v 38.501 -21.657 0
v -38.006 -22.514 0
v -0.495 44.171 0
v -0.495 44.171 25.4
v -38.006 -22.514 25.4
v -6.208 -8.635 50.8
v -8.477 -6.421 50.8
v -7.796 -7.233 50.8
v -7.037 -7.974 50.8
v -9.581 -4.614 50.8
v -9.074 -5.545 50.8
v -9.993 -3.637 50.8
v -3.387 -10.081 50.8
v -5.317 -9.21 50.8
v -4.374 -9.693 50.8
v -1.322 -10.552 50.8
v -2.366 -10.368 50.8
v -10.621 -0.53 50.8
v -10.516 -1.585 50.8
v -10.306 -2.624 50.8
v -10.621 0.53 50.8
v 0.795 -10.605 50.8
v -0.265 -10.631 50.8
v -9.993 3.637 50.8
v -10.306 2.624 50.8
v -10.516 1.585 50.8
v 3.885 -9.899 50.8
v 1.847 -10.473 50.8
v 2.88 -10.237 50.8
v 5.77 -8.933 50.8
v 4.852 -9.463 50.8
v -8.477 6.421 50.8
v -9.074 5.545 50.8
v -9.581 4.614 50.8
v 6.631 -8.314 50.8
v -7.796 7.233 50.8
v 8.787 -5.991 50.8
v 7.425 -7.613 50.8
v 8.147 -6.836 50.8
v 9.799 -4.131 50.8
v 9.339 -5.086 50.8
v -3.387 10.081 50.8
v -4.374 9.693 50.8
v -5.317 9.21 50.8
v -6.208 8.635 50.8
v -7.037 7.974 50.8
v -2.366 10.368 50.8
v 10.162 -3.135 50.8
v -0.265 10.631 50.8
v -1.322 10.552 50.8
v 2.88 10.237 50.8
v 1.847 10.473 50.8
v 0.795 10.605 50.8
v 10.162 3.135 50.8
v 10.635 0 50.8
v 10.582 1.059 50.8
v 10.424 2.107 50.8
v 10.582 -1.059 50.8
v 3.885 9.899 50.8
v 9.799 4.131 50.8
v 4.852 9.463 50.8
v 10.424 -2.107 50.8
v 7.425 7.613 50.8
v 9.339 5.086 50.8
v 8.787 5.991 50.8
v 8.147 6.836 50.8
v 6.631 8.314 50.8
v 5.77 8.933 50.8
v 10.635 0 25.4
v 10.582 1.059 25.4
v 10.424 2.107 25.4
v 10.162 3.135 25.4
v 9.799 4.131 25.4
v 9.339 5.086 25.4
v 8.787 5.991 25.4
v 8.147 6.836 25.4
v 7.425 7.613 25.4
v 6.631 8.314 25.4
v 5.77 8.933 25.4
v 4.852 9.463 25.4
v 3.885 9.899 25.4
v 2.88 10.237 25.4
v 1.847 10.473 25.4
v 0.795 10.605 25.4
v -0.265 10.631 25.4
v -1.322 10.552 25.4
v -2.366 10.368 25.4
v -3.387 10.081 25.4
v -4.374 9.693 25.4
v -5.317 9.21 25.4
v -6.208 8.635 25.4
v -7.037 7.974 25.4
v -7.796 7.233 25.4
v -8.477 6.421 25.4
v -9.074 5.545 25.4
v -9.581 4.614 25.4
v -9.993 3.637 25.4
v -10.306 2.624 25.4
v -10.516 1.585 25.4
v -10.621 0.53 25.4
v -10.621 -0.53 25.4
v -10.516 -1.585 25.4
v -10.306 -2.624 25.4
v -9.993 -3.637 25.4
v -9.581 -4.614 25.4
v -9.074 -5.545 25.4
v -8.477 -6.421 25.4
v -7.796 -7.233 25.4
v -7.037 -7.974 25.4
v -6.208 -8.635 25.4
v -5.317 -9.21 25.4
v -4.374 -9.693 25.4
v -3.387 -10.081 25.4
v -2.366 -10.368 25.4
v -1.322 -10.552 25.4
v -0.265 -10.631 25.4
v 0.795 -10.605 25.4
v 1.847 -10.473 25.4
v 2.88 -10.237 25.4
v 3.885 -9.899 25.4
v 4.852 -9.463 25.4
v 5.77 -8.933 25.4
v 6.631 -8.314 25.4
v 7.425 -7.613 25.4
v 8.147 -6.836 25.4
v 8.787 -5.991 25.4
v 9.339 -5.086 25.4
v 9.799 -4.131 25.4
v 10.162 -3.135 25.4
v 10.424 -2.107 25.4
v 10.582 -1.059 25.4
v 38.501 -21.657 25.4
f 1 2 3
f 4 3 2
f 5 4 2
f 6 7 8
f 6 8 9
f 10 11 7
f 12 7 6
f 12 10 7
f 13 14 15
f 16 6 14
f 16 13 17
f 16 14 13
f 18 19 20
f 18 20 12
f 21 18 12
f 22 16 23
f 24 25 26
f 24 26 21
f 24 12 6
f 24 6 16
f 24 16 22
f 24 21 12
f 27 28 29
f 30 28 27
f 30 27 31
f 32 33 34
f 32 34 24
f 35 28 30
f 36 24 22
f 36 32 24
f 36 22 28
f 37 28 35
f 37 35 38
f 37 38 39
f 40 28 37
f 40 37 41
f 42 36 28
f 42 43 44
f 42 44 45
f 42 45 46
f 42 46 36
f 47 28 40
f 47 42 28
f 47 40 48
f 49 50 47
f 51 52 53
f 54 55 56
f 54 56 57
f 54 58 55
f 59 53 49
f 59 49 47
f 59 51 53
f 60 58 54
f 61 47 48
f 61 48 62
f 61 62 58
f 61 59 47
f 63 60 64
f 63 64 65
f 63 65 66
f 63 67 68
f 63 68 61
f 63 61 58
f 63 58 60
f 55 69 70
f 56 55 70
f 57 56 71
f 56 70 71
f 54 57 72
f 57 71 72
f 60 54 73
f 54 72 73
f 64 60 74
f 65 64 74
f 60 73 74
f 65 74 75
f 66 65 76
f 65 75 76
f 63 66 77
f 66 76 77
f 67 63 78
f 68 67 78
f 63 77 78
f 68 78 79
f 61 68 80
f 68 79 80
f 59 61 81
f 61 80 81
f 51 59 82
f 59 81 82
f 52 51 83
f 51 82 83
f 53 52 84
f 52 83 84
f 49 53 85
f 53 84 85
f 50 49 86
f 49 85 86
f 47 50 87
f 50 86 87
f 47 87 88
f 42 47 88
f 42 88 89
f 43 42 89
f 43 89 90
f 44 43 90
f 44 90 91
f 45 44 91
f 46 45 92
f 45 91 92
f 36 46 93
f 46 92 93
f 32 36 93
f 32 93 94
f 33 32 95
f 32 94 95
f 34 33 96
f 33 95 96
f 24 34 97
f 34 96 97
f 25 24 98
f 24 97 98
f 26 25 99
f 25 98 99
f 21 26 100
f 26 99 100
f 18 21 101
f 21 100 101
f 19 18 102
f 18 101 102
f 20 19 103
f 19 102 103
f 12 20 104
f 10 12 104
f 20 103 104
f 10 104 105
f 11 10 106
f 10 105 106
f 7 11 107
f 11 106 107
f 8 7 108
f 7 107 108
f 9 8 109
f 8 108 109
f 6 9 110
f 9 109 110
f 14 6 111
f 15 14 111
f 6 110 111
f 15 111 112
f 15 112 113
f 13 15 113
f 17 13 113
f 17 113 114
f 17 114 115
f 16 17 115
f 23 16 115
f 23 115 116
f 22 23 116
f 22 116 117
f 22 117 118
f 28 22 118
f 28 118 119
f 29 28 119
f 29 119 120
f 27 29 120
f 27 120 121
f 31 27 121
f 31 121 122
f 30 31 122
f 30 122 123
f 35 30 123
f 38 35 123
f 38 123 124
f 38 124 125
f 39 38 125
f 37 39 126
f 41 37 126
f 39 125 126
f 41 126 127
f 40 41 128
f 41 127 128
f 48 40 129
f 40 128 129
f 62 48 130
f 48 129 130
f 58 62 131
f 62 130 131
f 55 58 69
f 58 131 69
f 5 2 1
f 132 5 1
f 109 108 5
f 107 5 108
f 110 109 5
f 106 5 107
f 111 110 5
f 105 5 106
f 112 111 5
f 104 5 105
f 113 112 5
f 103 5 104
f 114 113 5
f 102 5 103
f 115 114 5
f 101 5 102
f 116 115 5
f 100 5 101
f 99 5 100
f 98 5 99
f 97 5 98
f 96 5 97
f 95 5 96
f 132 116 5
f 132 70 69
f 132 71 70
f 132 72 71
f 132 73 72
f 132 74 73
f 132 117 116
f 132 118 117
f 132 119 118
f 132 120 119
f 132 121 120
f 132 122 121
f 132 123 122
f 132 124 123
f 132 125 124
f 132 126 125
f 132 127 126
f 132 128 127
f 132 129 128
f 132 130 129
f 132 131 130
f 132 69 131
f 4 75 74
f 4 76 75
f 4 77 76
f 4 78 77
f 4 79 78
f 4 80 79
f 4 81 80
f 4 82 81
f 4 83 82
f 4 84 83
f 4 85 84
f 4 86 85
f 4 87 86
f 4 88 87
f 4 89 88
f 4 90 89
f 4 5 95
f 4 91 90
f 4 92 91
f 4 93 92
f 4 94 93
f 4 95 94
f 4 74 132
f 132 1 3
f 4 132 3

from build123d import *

# Parameters (mm, degrees)
F1_DEPTH = 25.4
F2_R     = 10.634514
F3_DEPTH = 25.4
F4_R     = 5.192433
F5_DEPTH = 50.8


with BuildPart() as f1:
    # F0 (on Top) → F1 (new body)
    with BuildSketch(Plane.XY):
        Polygon((-0.495151, 44.171312), (-38.005903, -22.514469), (38.501054, -21.656843), align=None)
    extrude(amount=F1_DEPTH)

    # F2 (on face) → F3 (join)
    with BuildSketch(Plane.XY.offset(25.4)):
        Circle(F2_R)
    extrude(amount=F3_DEPTH)

    # F4 (on face) → F5 (join)
    with BuildSketch(Plane.XY.offset(50.8)):
        Circle(F4_R)
    extrude(amount=-F5_DEPTH)


solid = f1.part
